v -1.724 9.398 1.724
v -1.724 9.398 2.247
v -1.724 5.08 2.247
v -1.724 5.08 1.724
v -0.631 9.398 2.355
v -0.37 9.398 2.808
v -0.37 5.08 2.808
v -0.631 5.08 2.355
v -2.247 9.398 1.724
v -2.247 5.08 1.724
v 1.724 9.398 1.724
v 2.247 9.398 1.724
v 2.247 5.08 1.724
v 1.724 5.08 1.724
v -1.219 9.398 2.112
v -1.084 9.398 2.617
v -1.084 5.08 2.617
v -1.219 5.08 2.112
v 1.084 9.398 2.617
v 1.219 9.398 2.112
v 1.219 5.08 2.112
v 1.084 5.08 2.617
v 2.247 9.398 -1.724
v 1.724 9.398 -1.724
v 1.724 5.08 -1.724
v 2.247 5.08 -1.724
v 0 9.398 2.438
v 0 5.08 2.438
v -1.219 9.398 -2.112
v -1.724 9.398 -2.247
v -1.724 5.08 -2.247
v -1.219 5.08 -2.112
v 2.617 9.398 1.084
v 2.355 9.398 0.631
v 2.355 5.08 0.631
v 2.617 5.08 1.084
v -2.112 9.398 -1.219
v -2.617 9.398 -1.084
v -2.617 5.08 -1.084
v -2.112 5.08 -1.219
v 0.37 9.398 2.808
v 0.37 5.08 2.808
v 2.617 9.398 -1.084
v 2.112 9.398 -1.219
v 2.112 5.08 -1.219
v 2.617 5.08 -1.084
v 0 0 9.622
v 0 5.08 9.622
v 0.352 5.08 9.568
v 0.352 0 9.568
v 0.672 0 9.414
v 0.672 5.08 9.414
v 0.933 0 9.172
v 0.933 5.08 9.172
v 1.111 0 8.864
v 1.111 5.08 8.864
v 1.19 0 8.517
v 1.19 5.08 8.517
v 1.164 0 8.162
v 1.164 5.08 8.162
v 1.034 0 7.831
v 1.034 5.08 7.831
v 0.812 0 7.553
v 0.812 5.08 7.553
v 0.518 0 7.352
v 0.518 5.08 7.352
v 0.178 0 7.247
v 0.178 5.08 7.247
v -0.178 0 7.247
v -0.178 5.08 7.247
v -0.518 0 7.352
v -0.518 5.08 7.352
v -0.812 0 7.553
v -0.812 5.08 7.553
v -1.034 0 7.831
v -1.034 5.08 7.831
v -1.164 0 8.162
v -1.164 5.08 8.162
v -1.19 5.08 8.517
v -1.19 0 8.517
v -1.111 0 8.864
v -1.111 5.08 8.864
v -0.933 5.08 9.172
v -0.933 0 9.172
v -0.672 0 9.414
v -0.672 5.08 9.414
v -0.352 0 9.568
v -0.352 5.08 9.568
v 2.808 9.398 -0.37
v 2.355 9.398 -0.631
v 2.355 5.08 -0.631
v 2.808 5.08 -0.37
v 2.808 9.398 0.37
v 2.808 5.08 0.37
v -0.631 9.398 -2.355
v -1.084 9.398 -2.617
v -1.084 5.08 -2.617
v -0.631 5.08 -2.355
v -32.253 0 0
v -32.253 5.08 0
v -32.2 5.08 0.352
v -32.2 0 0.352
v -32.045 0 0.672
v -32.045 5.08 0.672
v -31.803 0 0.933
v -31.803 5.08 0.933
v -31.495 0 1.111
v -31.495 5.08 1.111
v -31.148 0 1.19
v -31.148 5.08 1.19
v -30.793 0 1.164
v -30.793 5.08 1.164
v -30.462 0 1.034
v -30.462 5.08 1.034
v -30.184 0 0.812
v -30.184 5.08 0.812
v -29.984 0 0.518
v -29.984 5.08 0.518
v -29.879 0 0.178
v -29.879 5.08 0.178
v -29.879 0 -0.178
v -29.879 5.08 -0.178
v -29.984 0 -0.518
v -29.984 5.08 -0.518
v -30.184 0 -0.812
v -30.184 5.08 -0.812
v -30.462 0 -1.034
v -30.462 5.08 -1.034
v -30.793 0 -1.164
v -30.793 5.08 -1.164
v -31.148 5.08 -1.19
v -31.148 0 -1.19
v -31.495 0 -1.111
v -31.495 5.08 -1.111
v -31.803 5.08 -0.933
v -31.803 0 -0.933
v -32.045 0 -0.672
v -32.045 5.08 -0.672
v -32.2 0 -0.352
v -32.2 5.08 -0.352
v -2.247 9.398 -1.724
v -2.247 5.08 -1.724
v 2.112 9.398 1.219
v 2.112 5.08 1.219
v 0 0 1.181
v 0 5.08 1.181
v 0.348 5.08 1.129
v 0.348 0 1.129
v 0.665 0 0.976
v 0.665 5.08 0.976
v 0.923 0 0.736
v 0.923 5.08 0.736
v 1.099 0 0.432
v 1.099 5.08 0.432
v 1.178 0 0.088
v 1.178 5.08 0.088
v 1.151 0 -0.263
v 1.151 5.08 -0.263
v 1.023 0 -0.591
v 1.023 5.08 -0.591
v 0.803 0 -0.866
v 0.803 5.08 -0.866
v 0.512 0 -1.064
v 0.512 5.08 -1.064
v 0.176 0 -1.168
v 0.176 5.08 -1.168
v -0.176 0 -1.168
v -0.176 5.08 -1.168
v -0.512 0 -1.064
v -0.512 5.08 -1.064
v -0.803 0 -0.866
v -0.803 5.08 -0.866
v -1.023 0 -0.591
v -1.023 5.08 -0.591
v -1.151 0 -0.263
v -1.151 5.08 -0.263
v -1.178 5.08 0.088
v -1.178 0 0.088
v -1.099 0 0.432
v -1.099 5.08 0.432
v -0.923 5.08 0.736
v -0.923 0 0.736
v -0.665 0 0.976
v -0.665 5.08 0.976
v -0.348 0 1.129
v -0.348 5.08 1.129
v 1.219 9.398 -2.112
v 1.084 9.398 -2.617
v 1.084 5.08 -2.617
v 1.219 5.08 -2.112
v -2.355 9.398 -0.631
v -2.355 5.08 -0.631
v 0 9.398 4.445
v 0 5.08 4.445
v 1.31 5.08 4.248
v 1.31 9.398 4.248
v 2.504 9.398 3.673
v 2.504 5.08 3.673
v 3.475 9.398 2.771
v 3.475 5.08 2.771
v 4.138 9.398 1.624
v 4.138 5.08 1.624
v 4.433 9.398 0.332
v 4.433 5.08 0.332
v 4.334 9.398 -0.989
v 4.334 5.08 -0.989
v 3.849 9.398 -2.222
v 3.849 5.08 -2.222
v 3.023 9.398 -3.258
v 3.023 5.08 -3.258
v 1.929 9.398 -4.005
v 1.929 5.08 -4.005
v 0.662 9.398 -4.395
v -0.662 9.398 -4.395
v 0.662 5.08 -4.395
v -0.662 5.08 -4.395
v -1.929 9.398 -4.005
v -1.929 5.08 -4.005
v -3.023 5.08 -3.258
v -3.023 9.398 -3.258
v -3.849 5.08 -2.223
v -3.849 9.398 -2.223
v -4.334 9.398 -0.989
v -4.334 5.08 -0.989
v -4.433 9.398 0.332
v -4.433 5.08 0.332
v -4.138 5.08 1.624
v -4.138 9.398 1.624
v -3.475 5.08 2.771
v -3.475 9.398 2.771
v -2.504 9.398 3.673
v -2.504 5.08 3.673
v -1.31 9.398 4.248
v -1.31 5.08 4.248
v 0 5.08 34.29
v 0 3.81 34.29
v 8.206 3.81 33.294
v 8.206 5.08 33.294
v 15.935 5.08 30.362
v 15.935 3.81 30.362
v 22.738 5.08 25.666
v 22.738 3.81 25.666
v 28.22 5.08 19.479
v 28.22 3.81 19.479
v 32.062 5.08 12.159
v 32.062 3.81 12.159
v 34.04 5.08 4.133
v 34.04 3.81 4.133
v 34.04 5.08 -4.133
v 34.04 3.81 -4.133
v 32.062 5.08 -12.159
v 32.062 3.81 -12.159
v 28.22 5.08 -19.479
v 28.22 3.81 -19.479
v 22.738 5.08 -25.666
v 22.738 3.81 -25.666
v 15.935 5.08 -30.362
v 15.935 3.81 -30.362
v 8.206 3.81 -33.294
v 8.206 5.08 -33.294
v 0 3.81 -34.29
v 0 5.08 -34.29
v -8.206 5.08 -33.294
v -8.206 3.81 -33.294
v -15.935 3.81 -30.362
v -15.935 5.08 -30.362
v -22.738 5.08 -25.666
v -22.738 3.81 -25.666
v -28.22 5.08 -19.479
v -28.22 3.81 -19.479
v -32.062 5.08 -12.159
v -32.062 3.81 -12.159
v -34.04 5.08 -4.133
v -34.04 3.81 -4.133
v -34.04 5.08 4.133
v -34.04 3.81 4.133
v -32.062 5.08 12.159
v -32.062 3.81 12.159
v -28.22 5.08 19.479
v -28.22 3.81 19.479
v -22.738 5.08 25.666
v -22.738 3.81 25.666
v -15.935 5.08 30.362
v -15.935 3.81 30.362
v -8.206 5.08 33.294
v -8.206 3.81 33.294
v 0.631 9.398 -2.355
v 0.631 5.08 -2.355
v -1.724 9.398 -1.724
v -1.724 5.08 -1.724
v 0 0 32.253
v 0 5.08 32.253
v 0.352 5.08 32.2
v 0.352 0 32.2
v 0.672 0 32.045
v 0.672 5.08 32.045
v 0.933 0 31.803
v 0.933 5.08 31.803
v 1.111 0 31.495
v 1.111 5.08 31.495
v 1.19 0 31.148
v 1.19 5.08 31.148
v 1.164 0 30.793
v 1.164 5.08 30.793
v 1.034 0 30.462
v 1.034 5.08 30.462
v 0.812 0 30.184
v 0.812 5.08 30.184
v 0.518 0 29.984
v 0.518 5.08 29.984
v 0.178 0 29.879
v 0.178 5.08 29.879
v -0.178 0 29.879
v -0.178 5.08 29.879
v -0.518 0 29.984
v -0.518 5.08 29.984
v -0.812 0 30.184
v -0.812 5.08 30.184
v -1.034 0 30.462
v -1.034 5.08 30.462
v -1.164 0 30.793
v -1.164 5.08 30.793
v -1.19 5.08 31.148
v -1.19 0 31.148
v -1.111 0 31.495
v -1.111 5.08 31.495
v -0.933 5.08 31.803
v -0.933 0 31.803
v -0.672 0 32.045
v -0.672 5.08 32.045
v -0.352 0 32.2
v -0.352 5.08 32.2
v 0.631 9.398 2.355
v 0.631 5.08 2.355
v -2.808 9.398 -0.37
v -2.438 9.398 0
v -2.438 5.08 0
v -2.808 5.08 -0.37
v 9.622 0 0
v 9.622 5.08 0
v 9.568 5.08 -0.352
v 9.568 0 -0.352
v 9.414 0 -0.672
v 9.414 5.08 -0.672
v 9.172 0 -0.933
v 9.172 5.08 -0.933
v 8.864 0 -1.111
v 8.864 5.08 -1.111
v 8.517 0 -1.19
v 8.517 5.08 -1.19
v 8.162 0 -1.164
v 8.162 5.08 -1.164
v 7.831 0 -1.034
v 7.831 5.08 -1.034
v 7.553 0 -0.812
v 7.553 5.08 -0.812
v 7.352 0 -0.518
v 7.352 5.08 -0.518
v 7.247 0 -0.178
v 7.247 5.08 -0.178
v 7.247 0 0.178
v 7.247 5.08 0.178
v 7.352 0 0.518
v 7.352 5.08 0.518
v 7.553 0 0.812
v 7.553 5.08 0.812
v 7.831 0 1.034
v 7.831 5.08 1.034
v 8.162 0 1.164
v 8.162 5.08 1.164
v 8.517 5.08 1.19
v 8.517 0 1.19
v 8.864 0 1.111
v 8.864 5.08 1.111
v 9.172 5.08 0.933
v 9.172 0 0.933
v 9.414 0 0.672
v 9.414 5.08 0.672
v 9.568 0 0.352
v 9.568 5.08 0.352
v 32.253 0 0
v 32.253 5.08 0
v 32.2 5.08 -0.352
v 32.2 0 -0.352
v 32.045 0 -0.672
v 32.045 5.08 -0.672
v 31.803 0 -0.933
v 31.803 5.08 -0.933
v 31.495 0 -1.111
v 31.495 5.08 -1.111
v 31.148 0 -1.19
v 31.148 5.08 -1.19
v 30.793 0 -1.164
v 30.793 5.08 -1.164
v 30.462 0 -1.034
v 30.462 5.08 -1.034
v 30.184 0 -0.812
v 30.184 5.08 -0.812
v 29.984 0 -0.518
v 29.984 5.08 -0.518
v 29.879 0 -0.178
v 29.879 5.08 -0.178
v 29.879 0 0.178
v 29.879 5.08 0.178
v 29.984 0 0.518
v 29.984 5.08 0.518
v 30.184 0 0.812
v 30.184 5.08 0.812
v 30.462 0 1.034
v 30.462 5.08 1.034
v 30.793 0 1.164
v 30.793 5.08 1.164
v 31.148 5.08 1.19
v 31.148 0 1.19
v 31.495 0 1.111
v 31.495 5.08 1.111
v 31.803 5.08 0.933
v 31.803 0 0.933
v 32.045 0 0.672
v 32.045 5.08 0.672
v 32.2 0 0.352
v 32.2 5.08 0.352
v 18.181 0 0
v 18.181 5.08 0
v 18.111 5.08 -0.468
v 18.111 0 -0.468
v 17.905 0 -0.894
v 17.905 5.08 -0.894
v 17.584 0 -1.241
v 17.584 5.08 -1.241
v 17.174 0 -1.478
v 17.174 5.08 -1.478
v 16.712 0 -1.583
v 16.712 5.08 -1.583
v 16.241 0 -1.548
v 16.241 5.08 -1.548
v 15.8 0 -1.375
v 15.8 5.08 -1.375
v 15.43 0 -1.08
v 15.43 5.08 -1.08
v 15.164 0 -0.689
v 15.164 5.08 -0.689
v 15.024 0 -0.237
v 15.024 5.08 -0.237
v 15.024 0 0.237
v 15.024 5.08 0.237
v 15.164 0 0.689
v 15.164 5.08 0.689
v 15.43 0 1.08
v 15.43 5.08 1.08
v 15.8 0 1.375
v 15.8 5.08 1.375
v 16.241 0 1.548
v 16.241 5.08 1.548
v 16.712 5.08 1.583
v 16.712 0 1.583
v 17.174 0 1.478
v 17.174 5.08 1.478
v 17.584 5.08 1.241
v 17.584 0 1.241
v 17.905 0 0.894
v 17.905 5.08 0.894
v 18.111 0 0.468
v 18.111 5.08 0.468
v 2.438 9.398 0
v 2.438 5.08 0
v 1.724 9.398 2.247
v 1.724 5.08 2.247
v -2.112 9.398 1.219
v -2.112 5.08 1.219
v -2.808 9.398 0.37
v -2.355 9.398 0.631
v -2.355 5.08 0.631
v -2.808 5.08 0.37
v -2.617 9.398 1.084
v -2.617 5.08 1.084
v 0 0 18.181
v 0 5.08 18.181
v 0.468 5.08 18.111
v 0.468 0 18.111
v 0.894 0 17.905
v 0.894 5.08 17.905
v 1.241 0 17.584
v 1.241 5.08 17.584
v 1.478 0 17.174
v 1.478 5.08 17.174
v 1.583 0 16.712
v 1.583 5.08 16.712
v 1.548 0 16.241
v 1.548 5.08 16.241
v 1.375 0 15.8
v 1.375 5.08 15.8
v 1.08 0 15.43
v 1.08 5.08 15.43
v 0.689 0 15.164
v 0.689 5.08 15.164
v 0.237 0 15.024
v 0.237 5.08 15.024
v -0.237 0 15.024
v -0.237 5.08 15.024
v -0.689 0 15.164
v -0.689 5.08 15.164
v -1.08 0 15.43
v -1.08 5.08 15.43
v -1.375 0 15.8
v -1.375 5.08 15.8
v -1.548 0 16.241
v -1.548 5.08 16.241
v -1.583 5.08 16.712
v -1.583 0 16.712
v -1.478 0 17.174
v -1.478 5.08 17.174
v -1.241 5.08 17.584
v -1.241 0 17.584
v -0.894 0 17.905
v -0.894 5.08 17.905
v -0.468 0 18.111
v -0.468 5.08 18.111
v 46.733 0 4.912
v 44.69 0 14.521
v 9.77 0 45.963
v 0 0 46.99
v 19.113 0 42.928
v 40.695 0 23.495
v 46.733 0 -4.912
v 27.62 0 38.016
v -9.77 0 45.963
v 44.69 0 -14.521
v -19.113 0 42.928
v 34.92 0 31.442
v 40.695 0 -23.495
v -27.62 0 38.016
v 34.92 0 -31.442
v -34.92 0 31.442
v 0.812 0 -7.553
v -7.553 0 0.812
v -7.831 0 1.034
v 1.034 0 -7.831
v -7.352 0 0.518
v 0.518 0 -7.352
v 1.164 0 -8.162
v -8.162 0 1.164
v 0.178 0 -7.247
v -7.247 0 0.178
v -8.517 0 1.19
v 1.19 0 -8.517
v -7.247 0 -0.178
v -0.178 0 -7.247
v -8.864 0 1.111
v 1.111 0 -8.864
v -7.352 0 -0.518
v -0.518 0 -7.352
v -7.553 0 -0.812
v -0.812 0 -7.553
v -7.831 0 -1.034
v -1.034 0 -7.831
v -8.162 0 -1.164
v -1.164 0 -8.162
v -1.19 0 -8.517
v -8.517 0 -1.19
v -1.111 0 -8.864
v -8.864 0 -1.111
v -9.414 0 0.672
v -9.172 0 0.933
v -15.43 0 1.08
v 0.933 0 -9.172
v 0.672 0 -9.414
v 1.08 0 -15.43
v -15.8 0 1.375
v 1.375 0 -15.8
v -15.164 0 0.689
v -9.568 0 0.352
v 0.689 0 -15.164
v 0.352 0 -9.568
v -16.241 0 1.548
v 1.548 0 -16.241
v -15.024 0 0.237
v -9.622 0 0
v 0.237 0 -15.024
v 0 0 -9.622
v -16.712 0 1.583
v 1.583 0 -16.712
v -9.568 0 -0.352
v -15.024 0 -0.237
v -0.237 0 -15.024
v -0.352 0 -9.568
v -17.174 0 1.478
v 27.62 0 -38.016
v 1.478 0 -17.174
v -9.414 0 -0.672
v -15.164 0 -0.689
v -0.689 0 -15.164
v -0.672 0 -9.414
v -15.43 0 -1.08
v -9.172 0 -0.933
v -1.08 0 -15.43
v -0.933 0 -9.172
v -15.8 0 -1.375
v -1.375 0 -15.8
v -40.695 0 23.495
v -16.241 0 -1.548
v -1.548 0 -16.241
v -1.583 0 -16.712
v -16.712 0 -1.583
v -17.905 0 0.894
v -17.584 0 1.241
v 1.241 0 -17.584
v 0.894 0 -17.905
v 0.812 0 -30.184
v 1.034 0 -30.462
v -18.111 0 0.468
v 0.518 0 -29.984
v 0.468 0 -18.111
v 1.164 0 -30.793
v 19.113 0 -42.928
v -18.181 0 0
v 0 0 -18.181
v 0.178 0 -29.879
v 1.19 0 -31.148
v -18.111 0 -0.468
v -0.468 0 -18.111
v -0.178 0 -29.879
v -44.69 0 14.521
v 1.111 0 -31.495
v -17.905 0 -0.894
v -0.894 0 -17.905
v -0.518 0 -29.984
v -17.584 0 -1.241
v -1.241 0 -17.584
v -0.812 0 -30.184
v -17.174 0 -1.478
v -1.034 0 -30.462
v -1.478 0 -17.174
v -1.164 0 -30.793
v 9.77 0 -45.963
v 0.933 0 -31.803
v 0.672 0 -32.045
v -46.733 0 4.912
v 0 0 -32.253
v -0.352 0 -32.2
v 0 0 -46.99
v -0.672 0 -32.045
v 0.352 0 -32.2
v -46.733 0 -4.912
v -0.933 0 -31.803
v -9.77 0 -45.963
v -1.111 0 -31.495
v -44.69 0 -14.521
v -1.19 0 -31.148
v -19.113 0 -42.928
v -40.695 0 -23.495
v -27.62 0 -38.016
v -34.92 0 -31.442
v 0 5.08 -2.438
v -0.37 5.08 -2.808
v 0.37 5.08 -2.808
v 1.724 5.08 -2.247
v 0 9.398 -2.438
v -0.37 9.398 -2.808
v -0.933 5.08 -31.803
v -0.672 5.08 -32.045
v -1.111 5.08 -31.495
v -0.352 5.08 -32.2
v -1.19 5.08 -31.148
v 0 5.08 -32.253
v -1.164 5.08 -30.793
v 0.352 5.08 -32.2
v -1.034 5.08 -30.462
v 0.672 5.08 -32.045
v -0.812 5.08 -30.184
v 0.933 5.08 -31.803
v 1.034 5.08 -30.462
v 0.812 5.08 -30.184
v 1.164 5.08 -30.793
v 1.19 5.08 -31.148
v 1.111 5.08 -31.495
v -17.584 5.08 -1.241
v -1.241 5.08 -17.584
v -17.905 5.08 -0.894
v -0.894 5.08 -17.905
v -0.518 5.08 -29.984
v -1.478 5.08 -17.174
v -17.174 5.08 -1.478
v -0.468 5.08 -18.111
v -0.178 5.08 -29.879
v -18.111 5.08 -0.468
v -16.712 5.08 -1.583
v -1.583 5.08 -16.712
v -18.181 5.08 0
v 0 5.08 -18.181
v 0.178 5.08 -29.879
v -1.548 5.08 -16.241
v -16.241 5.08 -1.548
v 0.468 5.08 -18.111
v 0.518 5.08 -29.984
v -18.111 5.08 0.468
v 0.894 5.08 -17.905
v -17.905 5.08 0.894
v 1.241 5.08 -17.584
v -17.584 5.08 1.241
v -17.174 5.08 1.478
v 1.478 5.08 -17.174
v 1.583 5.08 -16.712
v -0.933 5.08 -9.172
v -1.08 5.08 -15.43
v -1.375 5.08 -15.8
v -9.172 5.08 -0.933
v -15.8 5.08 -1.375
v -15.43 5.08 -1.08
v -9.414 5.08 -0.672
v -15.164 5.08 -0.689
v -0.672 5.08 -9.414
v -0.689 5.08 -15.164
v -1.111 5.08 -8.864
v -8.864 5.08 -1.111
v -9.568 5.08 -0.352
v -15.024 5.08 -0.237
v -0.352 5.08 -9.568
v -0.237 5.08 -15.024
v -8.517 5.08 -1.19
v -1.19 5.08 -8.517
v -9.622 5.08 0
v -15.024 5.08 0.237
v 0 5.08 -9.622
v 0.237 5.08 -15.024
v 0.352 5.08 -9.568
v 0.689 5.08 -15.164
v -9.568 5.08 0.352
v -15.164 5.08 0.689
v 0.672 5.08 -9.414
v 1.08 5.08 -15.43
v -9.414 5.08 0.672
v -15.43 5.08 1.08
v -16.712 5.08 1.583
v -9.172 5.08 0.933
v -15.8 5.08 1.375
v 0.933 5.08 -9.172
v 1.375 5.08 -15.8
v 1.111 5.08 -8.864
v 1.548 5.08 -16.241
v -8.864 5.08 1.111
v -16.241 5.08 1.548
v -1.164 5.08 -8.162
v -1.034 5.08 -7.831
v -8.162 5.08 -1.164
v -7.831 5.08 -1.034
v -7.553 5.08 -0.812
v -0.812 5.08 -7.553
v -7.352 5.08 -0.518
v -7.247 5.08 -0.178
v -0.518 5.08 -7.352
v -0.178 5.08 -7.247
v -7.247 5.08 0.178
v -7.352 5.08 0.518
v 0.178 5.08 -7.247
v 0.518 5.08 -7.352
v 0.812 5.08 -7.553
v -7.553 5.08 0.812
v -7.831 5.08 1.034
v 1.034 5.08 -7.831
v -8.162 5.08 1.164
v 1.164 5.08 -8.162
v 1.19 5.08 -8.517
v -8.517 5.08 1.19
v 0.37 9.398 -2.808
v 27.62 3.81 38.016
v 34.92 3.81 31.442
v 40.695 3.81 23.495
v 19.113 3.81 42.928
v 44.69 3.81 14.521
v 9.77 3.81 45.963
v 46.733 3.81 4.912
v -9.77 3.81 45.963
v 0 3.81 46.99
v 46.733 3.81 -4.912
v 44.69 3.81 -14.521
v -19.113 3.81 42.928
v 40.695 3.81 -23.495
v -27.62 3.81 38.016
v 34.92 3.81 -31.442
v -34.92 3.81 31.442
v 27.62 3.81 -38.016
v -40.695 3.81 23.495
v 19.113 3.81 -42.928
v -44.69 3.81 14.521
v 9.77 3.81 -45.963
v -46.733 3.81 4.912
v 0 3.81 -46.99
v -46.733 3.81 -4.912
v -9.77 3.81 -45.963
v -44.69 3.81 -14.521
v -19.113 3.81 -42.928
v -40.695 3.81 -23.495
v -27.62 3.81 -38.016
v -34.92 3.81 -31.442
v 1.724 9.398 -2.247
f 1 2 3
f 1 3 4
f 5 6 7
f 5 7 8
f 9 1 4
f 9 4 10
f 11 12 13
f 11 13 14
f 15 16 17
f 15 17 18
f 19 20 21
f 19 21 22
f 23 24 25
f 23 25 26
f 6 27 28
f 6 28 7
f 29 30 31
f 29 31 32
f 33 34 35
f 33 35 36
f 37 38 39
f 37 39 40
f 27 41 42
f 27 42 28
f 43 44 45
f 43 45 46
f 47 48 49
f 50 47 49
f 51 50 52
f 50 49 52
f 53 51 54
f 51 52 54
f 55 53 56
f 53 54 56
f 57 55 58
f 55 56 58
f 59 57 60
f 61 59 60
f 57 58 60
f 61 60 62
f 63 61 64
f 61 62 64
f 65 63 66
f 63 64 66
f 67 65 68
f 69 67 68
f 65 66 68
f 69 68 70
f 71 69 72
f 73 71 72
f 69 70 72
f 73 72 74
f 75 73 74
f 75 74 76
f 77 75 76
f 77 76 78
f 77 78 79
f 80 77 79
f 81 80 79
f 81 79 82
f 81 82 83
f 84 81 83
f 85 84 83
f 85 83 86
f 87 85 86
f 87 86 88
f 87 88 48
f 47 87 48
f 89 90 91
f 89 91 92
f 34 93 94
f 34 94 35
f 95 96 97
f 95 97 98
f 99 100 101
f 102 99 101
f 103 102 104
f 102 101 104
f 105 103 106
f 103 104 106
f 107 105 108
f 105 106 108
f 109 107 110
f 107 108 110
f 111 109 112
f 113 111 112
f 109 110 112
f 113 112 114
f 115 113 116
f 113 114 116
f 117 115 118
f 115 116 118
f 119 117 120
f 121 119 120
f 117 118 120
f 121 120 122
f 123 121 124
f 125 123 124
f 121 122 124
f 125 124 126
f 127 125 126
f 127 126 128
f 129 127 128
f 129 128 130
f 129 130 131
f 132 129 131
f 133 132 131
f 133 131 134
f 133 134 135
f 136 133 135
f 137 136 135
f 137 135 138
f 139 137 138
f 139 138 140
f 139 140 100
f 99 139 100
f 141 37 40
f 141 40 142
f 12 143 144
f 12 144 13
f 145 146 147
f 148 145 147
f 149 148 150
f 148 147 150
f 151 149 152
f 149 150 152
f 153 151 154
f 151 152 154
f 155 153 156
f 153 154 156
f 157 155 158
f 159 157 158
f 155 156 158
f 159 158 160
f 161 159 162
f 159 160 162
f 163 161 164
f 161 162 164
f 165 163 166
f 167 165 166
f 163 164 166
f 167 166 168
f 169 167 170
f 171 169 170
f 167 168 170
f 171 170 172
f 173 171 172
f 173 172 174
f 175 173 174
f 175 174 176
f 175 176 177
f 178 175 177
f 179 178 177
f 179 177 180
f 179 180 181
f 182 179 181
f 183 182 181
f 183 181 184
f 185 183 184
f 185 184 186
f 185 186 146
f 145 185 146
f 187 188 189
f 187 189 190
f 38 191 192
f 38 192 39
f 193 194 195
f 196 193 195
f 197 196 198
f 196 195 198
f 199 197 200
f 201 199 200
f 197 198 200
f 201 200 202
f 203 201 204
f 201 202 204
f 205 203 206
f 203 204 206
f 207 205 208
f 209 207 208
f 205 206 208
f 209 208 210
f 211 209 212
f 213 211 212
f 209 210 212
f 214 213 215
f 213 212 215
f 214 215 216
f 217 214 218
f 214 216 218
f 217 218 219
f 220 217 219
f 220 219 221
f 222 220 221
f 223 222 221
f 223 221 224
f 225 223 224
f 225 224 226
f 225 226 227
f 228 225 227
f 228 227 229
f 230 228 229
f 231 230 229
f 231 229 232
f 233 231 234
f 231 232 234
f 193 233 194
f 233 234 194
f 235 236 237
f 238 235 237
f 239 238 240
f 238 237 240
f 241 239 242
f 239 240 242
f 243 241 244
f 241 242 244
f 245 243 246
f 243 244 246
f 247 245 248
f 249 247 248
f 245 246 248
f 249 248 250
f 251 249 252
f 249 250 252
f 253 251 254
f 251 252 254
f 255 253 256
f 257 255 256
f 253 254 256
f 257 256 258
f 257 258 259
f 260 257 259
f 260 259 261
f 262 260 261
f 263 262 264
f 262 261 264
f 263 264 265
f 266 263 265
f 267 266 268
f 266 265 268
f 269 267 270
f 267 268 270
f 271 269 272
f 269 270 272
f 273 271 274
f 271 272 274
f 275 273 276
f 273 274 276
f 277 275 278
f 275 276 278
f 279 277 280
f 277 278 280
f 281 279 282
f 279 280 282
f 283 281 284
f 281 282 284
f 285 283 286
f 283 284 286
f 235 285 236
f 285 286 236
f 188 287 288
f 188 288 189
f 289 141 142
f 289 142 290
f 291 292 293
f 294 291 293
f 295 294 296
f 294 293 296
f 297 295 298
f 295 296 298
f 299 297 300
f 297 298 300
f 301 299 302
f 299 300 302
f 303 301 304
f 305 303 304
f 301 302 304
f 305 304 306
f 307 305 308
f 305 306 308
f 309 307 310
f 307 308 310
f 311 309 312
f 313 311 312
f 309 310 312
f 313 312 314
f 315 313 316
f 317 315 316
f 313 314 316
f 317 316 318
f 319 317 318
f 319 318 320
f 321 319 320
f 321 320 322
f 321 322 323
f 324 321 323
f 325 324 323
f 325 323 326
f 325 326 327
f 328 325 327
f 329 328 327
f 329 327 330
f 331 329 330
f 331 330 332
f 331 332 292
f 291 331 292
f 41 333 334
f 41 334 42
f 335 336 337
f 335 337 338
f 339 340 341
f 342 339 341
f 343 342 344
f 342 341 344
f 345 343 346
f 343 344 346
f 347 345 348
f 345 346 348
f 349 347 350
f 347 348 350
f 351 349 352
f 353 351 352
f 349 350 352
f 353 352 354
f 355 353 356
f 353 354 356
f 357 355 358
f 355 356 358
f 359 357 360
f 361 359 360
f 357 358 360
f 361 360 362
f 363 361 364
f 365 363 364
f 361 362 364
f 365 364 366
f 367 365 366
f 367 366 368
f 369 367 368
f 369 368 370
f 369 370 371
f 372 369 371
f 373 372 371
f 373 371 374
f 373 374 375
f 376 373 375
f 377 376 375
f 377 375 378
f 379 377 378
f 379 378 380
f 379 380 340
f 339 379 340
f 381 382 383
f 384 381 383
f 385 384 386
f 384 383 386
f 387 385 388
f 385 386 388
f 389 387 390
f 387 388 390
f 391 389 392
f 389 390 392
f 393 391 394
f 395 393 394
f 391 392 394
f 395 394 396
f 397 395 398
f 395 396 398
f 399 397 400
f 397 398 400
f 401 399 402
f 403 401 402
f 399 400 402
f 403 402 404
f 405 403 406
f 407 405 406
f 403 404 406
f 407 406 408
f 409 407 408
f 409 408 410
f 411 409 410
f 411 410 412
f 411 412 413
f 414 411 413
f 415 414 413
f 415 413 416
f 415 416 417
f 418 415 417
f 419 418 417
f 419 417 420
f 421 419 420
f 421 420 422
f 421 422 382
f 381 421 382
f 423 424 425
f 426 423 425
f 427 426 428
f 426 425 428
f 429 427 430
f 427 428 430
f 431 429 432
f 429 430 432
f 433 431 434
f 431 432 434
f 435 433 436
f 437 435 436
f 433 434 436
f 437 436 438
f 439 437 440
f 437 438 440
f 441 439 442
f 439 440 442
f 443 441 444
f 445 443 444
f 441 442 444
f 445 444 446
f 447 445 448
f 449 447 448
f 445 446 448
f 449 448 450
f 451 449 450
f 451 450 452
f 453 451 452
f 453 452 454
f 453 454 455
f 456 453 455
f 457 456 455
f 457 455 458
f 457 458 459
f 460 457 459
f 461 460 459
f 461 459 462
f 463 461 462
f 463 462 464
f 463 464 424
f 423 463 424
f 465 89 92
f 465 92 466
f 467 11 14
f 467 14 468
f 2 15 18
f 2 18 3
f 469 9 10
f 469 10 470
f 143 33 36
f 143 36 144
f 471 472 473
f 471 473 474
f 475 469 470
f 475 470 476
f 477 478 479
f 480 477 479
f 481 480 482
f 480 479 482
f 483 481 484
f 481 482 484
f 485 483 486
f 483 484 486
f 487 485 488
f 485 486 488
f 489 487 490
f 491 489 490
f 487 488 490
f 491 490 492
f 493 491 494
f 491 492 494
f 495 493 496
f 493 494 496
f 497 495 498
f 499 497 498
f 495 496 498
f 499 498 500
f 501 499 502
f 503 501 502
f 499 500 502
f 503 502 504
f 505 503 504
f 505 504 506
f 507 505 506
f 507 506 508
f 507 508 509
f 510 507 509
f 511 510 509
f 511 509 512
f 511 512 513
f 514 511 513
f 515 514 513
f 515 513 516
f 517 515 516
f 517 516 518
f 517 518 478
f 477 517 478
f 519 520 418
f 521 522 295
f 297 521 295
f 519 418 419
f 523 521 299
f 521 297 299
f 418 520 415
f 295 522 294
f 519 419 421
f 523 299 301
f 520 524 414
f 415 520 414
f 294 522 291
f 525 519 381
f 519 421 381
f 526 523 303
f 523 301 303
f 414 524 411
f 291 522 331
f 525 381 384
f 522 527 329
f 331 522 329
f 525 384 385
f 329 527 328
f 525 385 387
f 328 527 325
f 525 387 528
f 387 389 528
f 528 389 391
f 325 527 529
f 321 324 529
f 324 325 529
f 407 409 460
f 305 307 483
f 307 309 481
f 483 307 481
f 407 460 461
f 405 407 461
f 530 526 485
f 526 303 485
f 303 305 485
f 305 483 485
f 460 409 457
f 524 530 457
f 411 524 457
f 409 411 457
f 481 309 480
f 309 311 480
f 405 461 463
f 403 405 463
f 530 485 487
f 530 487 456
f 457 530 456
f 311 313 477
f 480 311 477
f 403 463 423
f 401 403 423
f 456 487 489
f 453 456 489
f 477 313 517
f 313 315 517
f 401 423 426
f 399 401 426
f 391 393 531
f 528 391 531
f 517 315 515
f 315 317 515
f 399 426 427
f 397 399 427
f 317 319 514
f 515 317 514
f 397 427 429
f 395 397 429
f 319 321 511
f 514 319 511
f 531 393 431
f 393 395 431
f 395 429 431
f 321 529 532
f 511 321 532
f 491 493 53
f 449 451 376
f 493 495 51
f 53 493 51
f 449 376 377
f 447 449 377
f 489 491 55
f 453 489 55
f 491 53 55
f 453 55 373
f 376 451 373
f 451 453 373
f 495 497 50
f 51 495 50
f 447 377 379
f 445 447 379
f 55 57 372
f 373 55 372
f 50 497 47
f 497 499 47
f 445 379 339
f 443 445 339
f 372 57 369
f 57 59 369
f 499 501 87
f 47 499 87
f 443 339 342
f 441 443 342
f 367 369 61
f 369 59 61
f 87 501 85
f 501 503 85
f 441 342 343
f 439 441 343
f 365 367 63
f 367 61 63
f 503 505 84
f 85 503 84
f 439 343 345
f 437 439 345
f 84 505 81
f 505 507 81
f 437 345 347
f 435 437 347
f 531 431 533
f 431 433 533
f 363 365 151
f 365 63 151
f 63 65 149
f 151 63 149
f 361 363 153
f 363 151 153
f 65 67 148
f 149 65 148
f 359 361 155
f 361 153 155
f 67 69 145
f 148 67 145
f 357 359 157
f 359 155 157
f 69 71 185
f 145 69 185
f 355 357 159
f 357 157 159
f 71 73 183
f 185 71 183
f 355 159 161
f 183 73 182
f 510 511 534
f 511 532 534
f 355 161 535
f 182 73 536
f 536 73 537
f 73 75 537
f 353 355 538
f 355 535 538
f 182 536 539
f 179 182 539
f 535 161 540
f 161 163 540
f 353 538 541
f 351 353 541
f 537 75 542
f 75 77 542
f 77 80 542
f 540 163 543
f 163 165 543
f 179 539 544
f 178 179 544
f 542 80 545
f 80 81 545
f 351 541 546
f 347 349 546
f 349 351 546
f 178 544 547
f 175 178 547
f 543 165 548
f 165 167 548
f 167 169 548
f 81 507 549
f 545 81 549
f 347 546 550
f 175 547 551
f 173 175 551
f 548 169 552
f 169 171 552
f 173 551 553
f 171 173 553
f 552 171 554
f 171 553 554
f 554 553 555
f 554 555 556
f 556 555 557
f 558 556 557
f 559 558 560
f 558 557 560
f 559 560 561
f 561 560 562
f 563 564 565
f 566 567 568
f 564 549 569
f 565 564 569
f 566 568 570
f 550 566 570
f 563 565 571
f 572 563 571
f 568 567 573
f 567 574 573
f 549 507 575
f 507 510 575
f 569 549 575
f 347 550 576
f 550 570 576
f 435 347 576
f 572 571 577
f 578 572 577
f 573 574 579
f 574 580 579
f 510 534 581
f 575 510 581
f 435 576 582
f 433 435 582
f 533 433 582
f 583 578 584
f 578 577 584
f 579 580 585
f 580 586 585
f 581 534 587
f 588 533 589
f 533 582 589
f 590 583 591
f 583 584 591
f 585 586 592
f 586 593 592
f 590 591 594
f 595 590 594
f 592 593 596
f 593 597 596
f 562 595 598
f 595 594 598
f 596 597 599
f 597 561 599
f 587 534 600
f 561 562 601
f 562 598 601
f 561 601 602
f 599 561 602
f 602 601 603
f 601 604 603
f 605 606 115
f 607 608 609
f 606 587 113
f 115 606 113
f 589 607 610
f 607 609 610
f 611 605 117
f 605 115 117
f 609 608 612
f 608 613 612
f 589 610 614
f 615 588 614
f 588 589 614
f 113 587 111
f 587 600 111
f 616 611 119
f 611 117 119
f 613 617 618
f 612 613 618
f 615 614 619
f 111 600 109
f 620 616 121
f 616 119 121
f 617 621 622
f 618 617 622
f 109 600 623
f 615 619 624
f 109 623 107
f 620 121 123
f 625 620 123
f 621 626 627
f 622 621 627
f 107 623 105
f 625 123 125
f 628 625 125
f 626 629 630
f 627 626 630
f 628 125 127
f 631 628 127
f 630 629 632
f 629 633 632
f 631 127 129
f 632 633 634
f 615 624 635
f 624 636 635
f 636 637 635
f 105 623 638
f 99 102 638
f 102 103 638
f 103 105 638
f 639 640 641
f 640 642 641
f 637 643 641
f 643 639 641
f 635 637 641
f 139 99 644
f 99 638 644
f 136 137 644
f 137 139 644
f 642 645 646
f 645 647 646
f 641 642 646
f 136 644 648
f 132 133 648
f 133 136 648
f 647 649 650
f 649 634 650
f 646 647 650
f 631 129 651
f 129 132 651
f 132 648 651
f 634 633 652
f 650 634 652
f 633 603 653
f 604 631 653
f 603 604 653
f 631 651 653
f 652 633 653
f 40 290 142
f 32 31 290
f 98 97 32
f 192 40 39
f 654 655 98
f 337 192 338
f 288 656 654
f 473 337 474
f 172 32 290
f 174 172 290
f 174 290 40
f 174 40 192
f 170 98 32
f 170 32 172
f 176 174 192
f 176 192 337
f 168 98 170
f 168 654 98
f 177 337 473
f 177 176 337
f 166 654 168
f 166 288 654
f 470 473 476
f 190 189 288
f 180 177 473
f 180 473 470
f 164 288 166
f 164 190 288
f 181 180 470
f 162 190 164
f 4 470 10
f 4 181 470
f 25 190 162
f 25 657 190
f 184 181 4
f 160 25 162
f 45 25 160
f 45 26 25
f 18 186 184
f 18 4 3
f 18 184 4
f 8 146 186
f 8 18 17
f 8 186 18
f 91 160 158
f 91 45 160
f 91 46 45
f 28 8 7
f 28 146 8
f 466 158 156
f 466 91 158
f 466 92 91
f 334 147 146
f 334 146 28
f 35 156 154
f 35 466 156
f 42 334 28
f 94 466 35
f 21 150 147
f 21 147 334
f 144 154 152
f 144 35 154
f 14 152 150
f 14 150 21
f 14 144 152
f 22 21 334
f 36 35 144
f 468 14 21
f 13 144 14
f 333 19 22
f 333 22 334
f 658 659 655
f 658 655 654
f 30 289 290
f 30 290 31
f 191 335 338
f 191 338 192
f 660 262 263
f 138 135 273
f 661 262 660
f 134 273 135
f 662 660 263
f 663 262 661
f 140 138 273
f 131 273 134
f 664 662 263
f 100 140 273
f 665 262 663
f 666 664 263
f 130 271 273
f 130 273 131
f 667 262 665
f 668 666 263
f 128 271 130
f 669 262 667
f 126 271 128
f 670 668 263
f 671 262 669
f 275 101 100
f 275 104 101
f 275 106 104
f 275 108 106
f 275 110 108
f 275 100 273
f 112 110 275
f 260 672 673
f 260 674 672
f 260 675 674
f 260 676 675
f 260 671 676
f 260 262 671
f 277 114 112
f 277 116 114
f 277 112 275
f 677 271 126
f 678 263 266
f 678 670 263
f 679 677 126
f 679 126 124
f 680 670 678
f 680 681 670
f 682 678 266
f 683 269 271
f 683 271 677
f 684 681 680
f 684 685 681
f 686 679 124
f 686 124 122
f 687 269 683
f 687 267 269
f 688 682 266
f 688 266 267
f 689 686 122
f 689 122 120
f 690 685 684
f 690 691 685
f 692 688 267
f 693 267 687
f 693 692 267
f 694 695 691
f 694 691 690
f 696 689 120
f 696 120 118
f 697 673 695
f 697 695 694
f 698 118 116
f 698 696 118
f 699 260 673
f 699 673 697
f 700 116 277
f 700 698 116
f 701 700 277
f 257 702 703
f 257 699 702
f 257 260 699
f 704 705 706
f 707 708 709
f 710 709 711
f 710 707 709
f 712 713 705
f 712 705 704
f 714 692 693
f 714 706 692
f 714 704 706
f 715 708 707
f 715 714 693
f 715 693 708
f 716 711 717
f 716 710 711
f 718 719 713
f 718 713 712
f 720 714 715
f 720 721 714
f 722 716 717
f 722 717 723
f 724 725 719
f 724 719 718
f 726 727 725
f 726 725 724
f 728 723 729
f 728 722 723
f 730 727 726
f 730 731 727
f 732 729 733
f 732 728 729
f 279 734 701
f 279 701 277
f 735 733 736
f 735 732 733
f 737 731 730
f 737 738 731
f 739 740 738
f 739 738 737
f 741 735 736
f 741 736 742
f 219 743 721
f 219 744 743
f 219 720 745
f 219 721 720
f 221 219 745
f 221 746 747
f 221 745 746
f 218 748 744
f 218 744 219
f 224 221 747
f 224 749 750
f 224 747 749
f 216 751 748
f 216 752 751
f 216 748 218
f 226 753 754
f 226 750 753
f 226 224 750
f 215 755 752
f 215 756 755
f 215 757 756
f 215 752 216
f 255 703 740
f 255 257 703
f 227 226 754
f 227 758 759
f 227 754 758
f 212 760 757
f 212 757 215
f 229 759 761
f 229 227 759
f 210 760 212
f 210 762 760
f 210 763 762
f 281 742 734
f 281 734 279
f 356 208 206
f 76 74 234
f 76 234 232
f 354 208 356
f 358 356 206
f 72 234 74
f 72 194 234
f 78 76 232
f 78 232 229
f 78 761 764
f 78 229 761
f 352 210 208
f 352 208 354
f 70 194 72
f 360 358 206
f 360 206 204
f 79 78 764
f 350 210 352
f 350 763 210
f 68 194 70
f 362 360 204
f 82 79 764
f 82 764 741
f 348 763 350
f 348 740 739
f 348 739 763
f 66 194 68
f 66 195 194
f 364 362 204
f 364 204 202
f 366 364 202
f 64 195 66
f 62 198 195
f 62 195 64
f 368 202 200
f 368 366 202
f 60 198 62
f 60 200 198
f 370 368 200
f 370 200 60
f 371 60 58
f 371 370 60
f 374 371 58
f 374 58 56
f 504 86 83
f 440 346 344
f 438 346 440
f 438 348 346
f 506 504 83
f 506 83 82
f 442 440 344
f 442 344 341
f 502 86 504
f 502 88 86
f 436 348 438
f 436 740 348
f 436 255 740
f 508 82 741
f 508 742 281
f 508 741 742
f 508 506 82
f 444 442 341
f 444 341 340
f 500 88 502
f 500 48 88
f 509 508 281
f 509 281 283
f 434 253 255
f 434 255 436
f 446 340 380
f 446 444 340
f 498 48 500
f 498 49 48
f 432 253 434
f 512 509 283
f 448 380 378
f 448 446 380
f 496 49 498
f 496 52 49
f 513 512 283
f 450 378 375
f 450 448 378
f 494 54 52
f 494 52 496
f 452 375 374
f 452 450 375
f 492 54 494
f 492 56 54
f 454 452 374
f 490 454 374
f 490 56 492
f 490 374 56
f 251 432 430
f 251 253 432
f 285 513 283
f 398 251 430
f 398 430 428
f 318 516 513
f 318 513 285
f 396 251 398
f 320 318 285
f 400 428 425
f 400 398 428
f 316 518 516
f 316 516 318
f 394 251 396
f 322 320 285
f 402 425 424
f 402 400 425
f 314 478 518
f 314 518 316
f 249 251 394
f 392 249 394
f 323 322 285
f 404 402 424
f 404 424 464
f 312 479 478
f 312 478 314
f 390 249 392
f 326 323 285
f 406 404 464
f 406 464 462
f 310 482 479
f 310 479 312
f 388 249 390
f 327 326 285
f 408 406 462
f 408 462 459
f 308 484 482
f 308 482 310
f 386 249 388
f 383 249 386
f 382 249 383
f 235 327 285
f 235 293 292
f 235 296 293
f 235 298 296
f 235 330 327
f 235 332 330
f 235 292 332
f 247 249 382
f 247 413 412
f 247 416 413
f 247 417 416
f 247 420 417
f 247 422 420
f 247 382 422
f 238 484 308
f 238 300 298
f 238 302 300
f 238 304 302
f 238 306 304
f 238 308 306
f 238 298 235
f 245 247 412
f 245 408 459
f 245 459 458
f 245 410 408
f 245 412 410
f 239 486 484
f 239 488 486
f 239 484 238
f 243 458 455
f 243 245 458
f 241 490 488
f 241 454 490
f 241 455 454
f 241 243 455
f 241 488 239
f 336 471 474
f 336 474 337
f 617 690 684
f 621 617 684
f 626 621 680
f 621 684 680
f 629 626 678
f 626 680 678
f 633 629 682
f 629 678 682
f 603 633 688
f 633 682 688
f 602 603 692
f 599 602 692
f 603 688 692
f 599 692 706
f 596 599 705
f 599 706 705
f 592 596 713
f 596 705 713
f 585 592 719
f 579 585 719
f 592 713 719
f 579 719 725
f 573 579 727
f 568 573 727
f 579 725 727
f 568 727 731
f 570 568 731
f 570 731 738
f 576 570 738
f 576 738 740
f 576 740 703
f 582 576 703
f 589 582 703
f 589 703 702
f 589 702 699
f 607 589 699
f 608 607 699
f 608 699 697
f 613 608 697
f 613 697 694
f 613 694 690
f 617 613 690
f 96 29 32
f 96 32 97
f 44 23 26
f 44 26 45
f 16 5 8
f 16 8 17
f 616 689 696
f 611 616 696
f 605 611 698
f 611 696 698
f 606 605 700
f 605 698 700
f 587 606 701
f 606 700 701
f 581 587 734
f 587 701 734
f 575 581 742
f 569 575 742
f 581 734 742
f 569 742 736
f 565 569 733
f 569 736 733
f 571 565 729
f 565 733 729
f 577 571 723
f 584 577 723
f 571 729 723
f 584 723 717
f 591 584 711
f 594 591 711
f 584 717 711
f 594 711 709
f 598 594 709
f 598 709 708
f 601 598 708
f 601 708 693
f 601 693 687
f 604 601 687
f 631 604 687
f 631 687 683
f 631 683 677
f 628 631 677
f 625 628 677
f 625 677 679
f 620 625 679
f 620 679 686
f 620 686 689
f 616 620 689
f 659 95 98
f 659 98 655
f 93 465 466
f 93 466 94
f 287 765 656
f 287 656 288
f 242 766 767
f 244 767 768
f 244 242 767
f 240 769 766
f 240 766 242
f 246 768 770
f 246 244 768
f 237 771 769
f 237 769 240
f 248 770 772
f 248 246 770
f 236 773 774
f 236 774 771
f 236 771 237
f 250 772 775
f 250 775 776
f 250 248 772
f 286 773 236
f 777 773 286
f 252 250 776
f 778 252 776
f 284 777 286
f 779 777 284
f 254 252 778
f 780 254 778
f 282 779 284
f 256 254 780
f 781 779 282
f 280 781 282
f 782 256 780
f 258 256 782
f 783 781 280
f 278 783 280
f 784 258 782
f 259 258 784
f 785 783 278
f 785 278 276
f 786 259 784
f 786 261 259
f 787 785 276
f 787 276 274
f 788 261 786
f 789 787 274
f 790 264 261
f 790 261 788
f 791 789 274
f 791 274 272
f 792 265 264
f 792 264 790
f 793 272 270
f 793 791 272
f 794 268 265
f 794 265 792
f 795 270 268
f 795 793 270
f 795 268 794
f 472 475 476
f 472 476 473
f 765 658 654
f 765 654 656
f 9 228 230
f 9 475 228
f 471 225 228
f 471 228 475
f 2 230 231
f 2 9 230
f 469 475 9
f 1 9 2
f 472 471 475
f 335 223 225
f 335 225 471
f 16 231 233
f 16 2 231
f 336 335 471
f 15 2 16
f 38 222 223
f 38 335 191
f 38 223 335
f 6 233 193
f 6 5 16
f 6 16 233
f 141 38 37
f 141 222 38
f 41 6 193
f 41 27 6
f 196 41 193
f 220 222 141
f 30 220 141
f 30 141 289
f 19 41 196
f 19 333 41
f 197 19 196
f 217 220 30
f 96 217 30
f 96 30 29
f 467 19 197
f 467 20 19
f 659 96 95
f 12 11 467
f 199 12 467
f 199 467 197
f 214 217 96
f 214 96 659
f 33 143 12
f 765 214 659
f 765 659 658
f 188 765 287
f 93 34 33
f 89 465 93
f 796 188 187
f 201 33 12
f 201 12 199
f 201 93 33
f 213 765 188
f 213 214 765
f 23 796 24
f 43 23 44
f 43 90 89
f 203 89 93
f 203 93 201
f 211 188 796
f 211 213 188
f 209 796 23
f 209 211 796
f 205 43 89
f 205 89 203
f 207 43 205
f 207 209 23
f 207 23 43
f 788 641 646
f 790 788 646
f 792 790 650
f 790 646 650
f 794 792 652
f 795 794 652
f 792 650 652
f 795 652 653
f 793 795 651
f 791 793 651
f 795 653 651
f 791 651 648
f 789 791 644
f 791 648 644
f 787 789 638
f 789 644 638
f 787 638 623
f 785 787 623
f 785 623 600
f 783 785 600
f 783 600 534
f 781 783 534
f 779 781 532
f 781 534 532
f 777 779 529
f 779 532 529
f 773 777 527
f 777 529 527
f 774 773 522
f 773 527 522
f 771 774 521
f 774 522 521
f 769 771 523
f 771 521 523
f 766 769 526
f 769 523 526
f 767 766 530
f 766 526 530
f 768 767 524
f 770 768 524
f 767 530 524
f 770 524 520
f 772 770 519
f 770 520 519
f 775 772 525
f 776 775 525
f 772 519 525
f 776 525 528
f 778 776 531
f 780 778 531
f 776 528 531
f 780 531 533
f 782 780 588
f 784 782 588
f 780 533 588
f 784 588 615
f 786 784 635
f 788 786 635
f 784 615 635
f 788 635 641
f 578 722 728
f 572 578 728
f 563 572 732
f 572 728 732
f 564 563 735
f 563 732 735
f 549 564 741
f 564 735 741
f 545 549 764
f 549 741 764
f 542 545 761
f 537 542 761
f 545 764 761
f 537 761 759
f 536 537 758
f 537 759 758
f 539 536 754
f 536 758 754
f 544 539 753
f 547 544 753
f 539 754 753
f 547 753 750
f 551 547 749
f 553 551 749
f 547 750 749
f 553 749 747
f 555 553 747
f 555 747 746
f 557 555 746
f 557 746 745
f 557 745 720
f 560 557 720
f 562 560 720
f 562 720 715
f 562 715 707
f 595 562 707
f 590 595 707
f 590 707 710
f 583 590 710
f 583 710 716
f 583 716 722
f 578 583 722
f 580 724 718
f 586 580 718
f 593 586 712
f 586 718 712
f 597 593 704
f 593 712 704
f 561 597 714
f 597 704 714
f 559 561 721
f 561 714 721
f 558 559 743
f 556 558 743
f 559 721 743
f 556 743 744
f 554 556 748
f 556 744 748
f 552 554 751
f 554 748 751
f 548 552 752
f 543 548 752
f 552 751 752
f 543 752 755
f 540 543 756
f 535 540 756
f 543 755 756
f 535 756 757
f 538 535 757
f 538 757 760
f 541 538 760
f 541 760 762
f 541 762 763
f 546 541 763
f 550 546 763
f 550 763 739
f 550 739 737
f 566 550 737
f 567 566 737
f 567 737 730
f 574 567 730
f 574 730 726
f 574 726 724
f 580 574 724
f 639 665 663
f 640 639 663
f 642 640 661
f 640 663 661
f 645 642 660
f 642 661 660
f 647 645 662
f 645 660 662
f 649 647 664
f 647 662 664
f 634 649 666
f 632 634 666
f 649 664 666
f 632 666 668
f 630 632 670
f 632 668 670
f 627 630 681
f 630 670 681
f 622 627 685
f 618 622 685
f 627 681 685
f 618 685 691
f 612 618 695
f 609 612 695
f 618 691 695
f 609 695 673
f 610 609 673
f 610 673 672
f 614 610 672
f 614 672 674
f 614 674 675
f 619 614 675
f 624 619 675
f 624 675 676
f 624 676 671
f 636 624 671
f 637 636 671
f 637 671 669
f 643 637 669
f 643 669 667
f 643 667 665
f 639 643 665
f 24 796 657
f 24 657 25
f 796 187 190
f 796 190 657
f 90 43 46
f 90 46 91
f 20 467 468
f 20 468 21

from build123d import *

# Parameters (mm, degrees)
SKETCH1_R         = 46.99
EXTRUDE1_DEPTH    = 3.81
SKETCH2_R         = 34.29
EXTRUDE2_DEPTH    = 1.27
SKETCH3_R         = 4.445
EXTRUDE3_DEPTH    = 4.318
SKETCH4_R         = 1.1811
EXTRUDE4_DEPTH    = 68.115144371
SKETCH5_R         = 1.1938
SKETCH5_R_2       = 1.5875
EXTRUDE5_DEPTH    = 67.647780158
CIRPATTERN1_COUNT = 4
SKETCH6_R         = 2.8321
EXTRUDE6_DEPTH    = 4.318
EXTRUDE7_DEPTH    = 4.318
CIRPATTERN2_COUNT = 24


with BuildPart() as part:
    # Sketch1 → Extrude1 (new body)
    with BuildSketch(Plane(origin=(0, 0, 0), x_dir=(1, 0, 0), z_dir=(0, 1, 0))):
        with Locations(Location((0, 0, 0), (0, 0, 90))):
            Circle(SKETCH1_R)
    extrude(amount=EXTRUDE1_DEPTH)

    # Sketch2 → Extrude2 (add)
    with BuildSketch(Plane(origin=(0, 3.81, 0), x_dir=(1, 0, 0), z_dir=(0, 1, 0))):
        with Locations(Location((0, 0, 0), (0, 0, 270))):
            Circle(SKETCH2_R)
    extrude(amount=EXTRUDE2_DEPTH)

    # Sketch3 → Extrude3 (add)
    with BuildSketch(Plane(origin=(0, 5.08, 0), x_dir=(1, 0, 0), z_dir=(0, 1, 0))):
        with Locations(Location((0, 0, 0), (0, 0, 270))):
            Circle(SKETCH3_R)
    extrude(amount=EXTRUDE3_DEPTH)

    # Sketch4 → Extrude4 (cut, through all)
    with BuildSketch(Plane(origin=(0, 9.398, 0), x_dir=(1, 0, 0), z_dir=(0, 1, 0))):
        with Locations(Location((0, 0, 0), (0, 0, 270))):
            Circle(SKETCH4_R)
    extrude(amount=-EXTRUDE4_DEPTH, mode=Mode.SUBTRACT)

    # Sketch5 → Extrude5 (cut, through all)
    with BuildSketch(Plane(origin=(0, 5.08, 0), x_dir=(1, 0, 0), z_dir=(0, 1, 0))):
        with Locations(Location((0, -8.42772, 0), (0, 0, 270))):
            Circle(SKETCH5_R)
        with Locations(Location((0, -16.59382, 0), (0, 0, 270))):
            Circle(SKETCH5_R_2)
        with Locations(Location((0, -31.05912, 0), (0, 0, 270))):
            Circle(SKETCH5_R)
    extrude5 = extrude(amount=-EXTRUDE5_DEPTH, mode=Mode.SUBTRACT)

    # CirPattern1: Extrude5 ×4 about axis
    cirpattern1_axis = Axis((0, 0, 0), (0, 1, 0))
    for i in range(1, CIRPATTERN1_COUNT):
        add(extrude5.rotate(cirpattern1_axis, i * 360 / CIRPATTERN1_COUNT), mode=Mode.SUBTRACT)

    # Sketch6 → Extrude6 (cut)
    with BuildSketch(Plane(origin=(0, 9.398, 0), x_dir=(1, 0, 0), z_dir=(0, 1, 0))):
        with Locations(Location((0, 0, 0), (0, 0, 270))):
            Circle(SKETCH6_R)
    extrude(amount=-EXTRUDE6_DEPTH, mode=Mode.SUBTRACT)

    # Sketch7 → Extrude7 (add)
    with BuildSketch(Plane(origin=(0, 9.398, 0), x_dir=(1, 0, 0), z_dir=(0, 1, 0))):
        Polygon((0, 2.4384), (0.369663229, 2.807870992), (0.369663229, 3.102932626), (-0.369663229, 3.102932626), (-0.369663229, 2.807870992), align=None)
    extrude7 = extrude(amount=-EXTRUDE7_DEPTH)

    # CirPattern2: Extrude7 ×24 about axis
    cirpattern2_axis = Axis((0, 0, 0), (0, 1, 0))
    for i in range(1, CIRPATTERN2_COUNT):
        add(extrude7.rotate(cirpattern2_axis, i * 360 / CIRPATTERN2_COUNT))


solid = part.part
